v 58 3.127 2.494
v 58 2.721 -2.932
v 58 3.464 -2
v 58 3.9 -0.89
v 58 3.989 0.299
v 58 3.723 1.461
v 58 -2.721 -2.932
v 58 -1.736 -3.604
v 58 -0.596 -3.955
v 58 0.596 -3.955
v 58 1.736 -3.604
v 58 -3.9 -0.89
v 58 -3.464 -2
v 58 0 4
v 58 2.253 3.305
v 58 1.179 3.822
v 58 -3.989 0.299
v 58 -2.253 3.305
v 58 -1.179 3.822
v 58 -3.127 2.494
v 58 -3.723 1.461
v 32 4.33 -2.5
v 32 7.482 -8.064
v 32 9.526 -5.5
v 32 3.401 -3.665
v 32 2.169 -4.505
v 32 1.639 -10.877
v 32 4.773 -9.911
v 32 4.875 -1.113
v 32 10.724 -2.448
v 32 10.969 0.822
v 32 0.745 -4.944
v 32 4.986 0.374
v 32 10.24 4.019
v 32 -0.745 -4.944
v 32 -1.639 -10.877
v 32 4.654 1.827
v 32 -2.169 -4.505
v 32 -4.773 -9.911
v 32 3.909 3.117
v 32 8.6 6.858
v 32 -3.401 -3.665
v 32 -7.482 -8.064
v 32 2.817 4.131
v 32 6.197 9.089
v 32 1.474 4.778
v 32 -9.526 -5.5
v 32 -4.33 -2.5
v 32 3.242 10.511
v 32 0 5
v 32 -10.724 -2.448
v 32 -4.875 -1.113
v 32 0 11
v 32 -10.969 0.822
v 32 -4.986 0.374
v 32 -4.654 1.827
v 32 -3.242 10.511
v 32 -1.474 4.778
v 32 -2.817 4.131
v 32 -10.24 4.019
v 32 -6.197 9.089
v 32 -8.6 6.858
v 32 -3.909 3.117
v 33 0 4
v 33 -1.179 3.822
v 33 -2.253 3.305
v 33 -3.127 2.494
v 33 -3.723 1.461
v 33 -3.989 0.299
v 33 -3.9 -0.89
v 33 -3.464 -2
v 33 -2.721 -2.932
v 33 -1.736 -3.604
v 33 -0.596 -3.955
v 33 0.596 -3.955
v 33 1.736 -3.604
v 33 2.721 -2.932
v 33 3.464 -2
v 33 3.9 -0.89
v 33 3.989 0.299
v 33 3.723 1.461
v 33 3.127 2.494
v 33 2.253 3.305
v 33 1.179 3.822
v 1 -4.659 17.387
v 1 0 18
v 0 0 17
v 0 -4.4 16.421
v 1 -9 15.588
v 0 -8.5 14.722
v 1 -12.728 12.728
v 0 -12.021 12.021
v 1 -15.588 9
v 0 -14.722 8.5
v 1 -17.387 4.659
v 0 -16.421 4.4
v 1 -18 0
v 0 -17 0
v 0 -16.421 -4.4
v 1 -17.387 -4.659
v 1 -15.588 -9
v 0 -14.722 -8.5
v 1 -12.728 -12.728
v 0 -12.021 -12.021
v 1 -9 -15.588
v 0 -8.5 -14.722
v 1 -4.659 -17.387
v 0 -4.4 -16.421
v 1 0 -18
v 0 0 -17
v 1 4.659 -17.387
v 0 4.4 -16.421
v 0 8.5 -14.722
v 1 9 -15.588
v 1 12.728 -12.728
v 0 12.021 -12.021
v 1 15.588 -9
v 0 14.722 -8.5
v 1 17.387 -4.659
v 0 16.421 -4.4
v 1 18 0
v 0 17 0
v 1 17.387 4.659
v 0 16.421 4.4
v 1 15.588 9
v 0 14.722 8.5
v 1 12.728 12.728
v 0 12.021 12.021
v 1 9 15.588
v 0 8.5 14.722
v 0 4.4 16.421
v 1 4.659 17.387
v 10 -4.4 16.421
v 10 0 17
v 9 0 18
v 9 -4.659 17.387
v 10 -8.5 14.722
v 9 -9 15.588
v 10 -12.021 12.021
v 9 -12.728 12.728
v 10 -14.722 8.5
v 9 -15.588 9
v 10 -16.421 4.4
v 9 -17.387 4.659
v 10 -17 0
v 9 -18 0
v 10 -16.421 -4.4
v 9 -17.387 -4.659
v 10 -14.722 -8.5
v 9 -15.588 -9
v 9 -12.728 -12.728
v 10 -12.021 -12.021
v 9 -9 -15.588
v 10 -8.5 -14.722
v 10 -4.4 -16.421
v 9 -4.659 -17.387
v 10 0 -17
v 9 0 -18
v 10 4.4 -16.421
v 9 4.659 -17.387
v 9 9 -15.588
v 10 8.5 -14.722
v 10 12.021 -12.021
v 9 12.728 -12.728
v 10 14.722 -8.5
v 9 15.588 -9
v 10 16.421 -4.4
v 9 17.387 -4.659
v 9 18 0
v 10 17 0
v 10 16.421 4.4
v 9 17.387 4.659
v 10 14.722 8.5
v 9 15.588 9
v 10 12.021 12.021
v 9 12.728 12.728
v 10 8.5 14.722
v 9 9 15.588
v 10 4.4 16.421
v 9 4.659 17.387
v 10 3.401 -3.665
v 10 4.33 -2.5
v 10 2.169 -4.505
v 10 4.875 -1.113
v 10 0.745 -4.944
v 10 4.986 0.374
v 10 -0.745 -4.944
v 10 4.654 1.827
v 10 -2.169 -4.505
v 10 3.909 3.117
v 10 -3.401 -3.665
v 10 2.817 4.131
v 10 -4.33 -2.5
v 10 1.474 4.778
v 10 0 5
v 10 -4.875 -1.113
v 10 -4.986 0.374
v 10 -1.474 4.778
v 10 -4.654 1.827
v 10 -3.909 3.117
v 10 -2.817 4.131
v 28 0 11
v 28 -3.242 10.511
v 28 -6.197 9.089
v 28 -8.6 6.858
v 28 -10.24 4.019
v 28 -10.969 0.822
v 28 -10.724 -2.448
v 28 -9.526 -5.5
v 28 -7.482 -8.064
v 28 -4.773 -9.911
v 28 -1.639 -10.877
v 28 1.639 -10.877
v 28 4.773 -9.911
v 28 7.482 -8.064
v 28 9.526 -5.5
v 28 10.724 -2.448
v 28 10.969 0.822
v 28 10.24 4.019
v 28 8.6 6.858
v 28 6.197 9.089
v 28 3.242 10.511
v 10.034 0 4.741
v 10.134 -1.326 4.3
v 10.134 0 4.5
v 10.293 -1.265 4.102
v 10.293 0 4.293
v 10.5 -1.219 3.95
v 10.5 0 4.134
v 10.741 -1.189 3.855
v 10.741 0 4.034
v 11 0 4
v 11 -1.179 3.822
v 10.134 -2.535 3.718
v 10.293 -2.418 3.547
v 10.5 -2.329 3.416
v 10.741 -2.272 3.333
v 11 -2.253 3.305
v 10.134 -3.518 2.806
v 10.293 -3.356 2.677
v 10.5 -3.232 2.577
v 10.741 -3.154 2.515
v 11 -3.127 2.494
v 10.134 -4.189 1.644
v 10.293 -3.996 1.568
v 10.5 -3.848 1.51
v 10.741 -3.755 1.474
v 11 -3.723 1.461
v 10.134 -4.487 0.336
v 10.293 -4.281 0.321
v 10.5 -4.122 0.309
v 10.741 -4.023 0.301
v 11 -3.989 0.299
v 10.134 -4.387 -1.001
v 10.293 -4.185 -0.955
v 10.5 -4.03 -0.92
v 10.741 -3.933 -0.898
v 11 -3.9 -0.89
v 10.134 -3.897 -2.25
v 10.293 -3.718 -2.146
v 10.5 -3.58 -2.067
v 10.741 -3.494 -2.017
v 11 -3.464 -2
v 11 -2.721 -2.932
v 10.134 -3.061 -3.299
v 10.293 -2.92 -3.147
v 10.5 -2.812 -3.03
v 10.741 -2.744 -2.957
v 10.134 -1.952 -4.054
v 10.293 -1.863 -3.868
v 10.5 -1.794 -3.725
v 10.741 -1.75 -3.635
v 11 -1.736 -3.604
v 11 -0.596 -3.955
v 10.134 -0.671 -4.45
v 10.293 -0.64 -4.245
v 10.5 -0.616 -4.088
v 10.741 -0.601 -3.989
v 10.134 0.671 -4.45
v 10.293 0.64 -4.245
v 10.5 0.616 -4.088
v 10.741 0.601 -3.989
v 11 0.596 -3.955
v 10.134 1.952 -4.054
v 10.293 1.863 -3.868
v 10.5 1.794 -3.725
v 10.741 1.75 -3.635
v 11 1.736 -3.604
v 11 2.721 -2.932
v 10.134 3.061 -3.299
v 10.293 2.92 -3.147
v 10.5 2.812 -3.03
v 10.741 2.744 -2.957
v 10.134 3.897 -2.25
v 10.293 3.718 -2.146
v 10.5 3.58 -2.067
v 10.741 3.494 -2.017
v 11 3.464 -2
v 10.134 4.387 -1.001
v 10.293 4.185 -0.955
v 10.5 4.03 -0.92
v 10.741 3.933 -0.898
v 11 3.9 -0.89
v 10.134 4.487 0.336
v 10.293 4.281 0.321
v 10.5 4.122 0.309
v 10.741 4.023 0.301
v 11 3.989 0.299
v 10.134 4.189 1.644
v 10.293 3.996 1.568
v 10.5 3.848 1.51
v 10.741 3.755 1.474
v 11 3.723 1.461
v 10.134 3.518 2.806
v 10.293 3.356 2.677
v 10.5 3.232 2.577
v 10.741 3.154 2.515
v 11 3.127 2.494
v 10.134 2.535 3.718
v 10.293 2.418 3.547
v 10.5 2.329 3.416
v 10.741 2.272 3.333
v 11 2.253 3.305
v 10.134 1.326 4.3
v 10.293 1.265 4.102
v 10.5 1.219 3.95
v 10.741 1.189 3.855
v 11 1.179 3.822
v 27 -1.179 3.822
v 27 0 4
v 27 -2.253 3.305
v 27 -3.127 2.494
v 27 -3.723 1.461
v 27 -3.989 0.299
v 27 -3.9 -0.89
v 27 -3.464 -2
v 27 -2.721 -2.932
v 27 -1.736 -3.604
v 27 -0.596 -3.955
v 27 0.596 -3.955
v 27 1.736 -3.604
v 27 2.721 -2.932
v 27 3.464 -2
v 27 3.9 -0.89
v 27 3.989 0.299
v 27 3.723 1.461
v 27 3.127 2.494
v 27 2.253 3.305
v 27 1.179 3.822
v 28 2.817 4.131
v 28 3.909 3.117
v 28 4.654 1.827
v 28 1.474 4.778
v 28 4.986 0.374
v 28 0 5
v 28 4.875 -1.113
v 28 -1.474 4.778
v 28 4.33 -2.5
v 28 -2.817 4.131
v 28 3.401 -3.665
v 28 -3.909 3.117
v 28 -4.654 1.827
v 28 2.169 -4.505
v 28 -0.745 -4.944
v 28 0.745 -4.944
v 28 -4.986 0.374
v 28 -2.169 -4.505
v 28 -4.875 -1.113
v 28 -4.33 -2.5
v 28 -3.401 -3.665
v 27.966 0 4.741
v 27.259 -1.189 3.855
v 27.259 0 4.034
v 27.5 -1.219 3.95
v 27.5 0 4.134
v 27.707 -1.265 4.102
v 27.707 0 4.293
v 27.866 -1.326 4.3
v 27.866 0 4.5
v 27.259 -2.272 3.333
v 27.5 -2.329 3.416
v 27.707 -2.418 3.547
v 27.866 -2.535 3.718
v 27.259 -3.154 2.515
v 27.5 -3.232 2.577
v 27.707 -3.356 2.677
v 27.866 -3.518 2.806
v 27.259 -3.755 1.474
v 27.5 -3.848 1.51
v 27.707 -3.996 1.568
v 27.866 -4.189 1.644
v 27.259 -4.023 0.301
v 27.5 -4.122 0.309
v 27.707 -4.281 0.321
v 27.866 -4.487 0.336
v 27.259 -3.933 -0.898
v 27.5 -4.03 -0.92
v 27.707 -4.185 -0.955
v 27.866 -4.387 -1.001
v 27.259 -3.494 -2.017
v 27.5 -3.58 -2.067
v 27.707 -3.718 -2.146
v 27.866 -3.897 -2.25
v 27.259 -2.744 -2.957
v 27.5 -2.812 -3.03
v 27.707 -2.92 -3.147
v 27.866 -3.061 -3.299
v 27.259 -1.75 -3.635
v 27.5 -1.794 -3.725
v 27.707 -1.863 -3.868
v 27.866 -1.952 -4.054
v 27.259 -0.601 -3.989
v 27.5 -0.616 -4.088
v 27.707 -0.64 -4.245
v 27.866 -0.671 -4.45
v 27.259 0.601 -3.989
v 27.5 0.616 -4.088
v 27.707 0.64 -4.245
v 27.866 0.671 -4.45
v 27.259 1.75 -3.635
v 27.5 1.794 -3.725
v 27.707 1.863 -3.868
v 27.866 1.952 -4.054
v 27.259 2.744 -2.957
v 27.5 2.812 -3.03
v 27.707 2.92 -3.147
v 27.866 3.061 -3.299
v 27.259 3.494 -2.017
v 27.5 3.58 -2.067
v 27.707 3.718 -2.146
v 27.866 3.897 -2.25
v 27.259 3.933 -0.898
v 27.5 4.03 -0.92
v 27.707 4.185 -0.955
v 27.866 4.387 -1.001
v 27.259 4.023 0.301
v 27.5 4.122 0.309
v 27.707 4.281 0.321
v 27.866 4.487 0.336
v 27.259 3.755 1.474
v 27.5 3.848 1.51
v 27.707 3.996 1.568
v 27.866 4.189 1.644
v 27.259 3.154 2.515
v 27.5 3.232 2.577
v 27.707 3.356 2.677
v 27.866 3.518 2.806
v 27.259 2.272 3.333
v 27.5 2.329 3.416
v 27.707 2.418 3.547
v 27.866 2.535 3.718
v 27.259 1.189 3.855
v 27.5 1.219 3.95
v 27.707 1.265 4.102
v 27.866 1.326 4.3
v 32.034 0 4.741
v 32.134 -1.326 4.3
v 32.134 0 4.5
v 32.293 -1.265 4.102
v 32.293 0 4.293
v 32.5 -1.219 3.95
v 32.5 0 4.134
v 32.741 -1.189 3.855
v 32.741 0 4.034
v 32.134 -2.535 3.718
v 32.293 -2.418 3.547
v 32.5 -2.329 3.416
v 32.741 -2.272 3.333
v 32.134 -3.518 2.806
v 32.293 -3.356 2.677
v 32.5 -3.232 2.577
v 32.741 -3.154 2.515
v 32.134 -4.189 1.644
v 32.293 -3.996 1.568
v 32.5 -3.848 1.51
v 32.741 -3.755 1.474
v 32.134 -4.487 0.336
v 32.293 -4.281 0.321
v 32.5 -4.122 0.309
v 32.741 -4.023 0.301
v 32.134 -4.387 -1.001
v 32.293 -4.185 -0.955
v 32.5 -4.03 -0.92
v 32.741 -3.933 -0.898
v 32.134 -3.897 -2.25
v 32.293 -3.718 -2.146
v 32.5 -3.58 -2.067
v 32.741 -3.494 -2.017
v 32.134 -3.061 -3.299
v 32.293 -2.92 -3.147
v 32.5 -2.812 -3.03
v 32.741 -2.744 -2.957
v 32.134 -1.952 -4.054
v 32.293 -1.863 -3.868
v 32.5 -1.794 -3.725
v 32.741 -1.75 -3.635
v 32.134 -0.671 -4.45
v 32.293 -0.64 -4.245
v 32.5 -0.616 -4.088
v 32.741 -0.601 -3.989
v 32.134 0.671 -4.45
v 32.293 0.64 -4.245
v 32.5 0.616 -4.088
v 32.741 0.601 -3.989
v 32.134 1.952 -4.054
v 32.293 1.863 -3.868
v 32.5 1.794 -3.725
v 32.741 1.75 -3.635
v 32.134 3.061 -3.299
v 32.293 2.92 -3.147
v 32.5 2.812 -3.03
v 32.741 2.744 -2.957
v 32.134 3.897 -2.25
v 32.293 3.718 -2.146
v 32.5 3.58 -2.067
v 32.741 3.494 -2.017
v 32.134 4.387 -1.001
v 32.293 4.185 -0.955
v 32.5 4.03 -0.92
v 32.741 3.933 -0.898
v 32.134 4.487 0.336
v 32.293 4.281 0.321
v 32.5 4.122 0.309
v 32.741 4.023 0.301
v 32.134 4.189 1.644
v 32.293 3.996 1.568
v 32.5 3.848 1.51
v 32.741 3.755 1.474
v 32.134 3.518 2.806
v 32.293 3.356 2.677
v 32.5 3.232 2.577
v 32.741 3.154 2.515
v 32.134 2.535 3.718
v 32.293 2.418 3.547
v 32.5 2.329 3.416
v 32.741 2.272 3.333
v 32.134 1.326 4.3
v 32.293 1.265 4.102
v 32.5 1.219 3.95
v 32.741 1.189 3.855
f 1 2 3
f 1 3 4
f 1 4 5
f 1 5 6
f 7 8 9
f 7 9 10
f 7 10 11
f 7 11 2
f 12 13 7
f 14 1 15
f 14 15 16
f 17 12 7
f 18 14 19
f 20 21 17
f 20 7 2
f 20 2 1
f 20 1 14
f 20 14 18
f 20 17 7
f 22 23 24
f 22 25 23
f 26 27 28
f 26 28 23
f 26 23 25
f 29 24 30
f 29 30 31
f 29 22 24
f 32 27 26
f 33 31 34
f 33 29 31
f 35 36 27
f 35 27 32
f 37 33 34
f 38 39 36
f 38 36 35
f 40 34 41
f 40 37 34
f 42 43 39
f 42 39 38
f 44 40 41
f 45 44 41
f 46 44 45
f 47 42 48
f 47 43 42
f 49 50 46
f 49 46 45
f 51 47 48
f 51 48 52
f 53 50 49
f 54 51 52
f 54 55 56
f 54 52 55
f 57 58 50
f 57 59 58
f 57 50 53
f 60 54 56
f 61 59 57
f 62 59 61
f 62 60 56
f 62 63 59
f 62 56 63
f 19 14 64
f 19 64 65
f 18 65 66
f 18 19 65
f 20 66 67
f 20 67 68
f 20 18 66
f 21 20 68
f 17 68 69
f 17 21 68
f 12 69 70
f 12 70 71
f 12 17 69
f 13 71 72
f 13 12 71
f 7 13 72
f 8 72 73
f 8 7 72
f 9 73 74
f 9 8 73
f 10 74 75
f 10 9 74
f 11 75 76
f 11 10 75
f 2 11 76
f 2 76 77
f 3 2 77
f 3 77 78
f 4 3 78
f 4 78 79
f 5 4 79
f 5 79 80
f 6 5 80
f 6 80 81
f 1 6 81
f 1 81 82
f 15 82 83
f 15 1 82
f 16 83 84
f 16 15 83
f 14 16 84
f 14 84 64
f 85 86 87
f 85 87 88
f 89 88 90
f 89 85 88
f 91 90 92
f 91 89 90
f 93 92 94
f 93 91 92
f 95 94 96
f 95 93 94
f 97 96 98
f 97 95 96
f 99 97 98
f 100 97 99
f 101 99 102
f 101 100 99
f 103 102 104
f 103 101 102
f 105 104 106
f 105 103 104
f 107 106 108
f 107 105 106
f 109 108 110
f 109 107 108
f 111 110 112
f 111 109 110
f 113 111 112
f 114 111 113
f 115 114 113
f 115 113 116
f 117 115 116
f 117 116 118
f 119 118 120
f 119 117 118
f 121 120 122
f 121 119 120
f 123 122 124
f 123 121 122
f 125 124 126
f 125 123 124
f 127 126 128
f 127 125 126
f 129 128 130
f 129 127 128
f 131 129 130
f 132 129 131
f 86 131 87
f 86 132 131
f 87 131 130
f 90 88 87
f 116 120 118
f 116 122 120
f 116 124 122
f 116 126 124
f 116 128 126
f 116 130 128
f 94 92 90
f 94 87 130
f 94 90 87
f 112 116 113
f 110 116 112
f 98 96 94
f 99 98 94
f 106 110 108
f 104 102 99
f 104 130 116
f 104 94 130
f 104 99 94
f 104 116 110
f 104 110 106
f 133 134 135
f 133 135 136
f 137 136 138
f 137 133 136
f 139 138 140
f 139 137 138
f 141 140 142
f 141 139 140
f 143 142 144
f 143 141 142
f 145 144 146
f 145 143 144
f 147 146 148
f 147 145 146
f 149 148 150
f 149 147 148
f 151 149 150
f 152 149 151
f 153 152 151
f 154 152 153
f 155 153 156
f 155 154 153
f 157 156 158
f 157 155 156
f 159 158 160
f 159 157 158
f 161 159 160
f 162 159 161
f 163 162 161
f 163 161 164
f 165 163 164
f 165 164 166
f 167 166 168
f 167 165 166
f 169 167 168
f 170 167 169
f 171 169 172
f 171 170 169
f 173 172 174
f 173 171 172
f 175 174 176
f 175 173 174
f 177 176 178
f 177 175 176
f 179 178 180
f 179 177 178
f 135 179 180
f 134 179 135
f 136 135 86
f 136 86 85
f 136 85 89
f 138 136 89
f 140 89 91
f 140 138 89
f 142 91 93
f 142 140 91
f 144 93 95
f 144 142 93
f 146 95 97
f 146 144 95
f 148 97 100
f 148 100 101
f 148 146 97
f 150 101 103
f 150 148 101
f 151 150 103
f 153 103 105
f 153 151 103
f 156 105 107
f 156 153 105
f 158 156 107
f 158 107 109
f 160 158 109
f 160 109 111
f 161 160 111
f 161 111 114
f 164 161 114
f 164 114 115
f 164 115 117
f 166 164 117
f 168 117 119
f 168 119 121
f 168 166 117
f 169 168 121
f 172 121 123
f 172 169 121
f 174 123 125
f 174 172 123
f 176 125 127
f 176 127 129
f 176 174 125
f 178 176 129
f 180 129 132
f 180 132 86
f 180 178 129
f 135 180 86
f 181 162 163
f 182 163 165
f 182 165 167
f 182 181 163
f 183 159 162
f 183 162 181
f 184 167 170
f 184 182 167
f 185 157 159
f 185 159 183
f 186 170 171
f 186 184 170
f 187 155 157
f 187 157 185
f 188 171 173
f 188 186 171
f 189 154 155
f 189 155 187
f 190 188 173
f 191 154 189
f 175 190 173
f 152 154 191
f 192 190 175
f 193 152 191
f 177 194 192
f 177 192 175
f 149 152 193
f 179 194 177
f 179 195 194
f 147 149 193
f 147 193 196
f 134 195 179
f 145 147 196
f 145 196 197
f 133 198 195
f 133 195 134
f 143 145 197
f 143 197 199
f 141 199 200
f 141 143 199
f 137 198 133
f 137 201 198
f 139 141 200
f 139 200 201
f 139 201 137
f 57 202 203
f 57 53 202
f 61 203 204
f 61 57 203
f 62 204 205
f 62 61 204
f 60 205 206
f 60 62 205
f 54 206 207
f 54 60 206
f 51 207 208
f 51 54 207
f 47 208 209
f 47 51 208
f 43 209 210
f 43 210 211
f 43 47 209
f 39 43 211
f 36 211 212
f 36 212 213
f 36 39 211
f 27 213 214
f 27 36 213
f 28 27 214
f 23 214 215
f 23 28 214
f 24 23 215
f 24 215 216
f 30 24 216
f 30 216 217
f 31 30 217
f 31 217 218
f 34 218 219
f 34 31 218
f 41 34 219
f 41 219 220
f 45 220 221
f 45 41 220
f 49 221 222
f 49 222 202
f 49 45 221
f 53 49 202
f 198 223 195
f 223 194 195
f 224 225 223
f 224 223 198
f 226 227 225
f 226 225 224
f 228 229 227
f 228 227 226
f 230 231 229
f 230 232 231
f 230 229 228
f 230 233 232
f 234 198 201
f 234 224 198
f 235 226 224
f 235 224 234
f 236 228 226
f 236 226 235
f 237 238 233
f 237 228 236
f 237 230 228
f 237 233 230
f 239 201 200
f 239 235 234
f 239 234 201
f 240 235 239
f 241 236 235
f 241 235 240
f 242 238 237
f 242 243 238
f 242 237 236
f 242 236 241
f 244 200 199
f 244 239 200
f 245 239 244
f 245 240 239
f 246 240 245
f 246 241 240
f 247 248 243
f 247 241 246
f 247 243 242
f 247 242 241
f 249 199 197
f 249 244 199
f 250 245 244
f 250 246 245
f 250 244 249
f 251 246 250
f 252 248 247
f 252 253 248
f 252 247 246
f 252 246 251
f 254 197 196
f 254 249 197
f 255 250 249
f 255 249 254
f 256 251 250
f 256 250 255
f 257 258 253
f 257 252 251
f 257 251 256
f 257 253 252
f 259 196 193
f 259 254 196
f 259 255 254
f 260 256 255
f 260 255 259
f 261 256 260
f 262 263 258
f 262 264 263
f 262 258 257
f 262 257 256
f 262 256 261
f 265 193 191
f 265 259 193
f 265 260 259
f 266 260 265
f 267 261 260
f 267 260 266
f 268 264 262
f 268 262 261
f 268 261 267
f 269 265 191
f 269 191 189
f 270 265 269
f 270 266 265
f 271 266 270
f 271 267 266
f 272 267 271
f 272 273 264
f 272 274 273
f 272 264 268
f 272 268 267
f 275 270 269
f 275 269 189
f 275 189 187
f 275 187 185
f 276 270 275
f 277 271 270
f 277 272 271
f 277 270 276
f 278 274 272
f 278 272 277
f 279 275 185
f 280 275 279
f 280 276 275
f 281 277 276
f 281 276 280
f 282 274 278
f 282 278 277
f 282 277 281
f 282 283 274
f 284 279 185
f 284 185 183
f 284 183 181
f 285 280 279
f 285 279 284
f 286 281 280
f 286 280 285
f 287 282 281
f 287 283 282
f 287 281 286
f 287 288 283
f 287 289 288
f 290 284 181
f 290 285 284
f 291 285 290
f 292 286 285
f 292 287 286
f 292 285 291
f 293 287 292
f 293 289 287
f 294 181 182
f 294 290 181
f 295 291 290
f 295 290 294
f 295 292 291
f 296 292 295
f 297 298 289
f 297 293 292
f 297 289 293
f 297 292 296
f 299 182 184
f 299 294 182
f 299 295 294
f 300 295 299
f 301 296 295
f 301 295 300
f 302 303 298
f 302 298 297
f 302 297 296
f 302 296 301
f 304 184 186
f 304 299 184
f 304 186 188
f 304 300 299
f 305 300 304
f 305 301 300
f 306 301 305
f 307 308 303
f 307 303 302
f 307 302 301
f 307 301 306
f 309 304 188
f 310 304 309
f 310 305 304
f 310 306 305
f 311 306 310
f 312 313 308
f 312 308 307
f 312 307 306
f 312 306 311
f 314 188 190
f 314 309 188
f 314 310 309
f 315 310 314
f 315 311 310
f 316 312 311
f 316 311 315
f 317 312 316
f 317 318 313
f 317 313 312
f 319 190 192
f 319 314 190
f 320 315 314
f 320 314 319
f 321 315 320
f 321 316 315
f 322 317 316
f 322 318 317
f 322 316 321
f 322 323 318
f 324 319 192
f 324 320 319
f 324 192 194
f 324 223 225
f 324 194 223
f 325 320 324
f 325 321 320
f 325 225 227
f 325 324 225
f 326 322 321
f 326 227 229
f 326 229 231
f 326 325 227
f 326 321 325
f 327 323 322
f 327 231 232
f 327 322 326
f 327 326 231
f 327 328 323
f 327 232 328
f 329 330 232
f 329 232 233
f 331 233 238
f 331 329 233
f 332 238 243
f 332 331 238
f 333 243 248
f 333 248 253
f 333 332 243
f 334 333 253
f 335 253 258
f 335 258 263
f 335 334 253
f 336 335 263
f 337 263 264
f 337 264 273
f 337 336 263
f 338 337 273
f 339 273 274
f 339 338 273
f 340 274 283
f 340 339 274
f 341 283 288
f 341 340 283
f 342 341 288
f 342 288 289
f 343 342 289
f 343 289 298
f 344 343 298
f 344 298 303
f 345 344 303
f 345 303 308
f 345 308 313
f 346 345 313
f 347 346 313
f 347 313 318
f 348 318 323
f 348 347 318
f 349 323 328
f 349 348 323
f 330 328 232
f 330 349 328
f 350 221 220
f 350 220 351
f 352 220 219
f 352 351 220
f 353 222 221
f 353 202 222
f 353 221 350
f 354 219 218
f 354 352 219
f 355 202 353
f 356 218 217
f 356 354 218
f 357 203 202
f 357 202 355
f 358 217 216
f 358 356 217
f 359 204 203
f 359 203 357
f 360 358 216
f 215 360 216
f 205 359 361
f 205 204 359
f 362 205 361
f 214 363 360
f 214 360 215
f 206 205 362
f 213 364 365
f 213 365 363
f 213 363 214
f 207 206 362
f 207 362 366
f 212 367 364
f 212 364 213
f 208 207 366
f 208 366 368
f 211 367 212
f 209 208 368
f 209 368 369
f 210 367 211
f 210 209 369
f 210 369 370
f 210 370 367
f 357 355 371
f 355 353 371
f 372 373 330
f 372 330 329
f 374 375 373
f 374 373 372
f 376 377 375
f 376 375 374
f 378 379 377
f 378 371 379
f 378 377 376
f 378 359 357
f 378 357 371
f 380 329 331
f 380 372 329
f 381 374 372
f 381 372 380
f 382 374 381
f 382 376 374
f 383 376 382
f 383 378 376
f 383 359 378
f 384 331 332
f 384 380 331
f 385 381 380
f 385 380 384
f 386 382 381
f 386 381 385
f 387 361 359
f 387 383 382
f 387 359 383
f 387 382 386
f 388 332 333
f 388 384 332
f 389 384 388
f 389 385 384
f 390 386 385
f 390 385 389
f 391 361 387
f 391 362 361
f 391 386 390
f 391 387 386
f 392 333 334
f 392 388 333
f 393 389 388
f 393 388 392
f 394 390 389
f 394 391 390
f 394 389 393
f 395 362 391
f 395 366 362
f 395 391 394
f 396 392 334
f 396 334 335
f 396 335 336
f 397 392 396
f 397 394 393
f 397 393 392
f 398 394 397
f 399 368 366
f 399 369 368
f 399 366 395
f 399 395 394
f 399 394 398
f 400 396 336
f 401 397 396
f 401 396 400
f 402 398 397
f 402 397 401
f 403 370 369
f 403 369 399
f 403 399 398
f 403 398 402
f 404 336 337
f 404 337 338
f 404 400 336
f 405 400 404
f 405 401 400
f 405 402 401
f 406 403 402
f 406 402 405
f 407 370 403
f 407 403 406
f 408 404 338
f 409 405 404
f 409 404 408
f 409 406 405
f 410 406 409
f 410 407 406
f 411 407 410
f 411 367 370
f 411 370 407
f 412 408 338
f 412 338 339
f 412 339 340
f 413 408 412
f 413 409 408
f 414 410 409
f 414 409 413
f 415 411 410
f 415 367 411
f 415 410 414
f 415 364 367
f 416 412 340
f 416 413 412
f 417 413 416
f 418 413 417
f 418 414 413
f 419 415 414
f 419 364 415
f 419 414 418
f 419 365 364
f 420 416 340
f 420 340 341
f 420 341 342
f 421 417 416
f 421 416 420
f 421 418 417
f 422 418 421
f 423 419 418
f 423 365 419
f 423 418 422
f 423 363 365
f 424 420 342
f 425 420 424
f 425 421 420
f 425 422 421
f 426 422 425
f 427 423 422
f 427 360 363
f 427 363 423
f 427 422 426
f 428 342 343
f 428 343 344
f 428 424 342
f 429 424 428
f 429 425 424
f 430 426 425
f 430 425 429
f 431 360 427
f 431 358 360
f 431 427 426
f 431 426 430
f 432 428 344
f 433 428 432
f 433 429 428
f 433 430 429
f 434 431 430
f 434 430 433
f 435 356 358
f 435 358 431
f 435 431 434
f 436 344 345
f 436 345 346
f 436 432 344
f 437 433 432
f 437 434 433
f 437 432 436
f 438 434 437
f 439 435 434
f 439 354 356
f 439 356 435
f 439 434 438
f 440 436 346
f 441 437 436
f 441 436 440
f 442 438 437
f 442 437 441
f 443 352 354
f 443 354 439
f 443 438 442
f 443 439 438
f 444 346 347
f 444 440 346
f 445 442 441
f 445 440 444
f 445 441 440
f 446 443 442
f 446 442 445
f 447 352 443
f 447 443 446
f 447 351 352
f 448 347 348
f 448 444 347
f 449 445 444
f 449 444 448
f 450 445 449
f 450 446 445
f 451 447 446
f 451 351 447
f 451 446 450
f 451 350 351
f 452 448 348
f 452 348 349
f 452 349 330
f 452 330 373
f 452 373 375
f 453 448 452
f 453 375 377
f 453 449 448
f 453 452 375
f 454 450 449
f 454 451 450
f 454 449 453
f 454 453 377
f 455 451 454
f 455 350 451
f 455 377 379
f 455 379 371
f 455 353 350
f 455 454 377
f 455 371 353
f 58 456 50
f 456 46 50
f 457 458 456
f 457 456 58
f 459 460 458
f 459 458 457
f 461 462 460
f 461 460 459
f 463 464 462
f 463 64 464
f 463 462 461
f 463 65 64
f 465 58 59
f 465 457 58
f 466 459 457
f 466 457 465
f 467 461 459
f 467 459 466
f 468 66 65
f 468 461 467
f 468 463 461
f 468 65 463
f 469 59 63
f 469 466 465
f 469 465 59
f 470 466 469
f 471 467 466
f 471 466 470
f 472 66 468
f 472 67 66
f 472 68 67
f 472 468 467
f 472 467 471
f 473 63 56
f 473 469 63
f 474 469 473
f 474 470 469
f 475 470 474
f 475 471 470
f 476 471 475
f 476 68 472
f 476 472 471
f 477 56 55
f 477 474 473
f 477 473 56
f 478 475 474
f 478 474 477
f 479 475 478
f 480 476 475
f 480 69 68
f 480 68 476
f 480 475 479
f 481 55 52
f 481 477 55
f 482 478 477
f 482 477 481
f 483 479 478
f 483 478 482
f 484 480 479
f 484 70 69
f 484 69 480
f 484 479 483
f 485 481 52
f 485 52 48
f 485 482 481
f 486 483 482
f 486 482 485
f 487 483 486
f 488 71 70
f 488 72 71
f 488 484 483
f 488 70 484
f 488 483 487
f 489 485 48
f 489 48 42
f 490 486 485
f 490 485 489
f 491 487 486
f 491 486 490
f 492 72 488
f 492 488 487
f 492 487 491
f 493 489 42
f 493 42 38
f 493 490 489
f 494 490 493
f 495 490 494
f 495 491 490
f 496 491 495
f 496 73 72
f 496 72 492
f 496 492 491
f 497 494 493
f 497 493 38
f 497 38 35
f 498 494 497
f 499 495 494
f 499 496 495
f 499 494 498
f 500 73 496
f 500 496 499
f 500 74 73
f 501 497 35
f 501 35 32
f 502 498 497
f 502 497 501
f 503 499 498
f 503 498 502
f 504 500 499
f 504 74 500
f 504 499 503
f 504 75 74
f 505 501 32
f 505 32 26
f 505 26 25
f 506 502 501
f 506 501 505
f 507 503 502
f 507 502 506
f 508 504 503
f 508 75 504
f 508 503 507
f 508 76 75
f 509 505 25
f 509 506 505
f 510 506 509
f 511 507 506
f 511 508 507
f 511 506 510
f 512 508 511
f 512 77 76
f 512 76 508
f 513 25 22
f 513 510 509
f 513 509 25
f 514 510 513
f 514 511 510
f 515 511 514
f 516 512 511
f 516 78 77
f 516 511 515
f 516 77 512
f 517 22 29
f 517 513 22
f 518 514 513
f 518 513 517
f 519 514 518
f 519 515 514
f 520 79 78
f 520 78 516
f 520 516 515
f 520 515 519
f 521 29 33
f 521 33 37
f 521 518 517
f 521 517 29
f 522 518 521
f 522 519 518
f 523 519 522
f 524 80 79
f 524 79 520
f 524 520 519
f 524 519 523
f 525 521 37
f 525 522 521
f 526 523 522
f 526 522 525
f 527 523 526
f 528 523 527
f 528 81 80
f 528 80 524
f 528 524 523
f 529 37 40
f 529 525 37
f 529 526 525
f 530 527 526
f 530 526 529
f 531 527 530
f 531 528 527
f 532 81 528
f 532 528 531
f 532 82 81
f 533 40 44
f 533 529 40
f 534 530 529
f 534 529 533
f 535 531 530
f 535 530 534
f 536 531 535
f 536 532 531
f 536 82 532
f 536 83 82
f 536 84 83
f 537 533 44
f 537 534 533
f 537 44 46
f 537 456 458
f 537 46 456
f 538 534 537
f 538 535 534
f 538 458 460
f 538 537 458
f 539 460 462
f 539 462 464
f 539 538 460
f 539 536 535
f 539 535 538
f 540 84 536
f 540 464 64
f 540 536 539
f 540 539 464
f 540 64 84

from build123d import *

# Parameters (mm, degrees)
CHAMFER1_SIZE = 1
FILLET1_R     = 1


with BuildPart() as part:
    # Sketch1 → Revolve1 (revolve)
    with BuildSketch(Plane.XY, mode=Mode.PRIVATE) as revolve1_sk:
        Polygon((0, 0), (0, 18), (10, 18), (10, 4), (28, 4), (28, 11), (32, 11), (32, 4), (58, 4), (58, 0), align=None)
    revolve(revolve1_sk.sketch.rotate(Axis((0, 0, 0), (1, 0, 0)), 90), axis=Axis((0, 0, 0), (1, 0, 0)))

    # Chamfer1
    chamfer1_edges = [part.edges().sort_by_distance(p)[0] for p in [
        (10, 0, -18),
        (0, 0, -18),
    ]]
    chamfer(chamfer1_edges, length=CHAMFER1_SIZE)

    # Fillet1
    fillet1_edges = [part.edges().sort_by_distance(p)[0] for p in [
        (28, 0, -4),
        (10, 0, -4),
        (32, 0, -4),
    ]]
    fillet(fillet1_edges, radius=FILLET1_R)


solid = part.part
